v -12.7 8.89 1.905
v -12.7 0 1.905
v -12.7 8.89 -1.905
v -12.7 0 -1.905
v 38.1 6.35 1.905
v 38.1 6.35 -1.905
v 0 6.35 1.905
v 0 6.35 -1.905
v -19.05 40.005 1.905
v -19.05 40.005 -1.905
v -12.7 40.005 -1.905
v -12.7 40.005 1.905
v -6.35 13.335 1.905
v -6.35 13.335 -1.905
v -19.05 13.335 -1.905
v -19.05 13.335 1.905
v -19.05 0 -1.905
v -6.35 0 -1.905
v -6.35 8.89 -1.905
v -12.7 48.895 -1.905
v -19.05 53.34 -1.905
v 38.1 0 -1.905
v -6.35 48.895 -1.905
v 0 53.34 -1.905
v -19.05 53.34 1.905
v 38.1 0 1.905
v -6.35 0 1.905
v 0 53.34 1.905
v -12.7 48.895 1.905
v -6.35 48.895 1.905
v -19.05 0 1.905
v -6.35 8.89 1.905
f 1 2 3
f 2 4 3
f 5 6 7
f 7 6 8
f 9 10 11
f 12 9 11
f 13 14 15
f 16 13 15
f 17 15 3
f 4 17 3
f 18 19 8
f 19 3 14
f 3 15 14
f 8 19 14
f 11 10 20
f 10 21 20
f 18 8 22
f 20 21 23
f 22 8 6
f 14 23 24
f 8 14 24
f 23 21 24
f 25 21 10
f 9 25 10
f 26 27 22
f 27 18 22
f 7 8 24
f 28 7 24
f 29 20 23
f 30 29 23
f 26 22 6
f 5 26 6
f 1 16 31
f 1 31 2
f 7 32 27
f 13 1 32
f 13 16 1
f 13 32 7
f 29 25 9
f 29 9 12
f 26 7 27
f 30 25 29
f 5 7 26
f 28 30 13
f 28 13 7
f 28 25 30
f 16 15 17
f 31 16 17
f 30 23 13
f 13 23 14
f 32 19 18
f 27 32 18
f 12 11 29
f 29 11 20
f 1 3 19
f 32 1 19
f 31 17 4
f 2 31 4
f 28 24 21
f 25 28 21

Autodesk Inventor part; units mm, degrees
ref_plane "YZ Plane" through (0, 0, 0) normal (1, 0, 0) x (0, 1, 0)
ref_plane "XZ Plane" through (0, 0, 0) normal (0, 1, 0) x (-1, 0, 0)
ref_plane "XY Plane" through (0, 0, 0) normal (0, 0, 1) x (1, 0, 0)
sketch "Sketch1" plane through (0, 0, 0) normal (0, 0, 1) x (1, 0, 0)
  line L0 (0, 6.35) -> (0, 53.34)
  line L1 (0, 53.34) -> (-19.05, 53.34)
  line L2 (-19.05, 53.34) -> (-19.05, 55.245)
  line L3 (-12.7, 48.895) -> (-6.35, 48.895)
  line L4 (-6.35, 48.895) -> (-6.35, 13.335)
  line L5 (-6.35, 13.335) -> (-19.05, 13.335)
  line L6 (-19.05, 13.335) -> (-19.05, 12.7)
  line L7 (-12.7, 8.89) -> (-6.35, 8.89)
  line L8 (-6.35, 8.89) -> (-6.35, 0)
  line L9 (-6.35, 0) -> (0, 0)
  line L10 (-19.05, 55.245) -> (-19.05, 40.005)
  line L11 (-19.05, 40.005) -> (-12.7, 40.005)
  line L12 (-12.7, 40.005) -> (-12.7, 48.895)
  line L13 (-19.05, 12.7) -> (-19.05, 0)
  line L14 (-19.05, 0) -> (-12.7, 0)
  line L15 (-12.7, 0) -> (-12.7, 8.89)
  line L16 (0, 0) -> (38.1, 0)
  line L17 (38.1, 0) -> (38.1, 6.35)
  line L18 (38.1, 6.35) -> (0, 6.35)
  point P0 (-19.05, 53.34)
  point P1 (-19.05, 11.43)
  dimension "d1" = 35.56
  dimension "d2" = 4.445
  dimension "d3" = 4.445
  dimension "d4" = 6.35
  dimension "d6" = 6.35
  dimension "d7" = 6.35
  dimension "d10" = 38.1
  dimension "d13" = 13.335
  dimension "d14" = 13.335
extrude "Extrusion1" add sketch "Sketch1" along normal mid plane 3.81
equation "\"d11\" = width"
equation "\"width\" = 3.81"
properties part number "basicHangerV01"
